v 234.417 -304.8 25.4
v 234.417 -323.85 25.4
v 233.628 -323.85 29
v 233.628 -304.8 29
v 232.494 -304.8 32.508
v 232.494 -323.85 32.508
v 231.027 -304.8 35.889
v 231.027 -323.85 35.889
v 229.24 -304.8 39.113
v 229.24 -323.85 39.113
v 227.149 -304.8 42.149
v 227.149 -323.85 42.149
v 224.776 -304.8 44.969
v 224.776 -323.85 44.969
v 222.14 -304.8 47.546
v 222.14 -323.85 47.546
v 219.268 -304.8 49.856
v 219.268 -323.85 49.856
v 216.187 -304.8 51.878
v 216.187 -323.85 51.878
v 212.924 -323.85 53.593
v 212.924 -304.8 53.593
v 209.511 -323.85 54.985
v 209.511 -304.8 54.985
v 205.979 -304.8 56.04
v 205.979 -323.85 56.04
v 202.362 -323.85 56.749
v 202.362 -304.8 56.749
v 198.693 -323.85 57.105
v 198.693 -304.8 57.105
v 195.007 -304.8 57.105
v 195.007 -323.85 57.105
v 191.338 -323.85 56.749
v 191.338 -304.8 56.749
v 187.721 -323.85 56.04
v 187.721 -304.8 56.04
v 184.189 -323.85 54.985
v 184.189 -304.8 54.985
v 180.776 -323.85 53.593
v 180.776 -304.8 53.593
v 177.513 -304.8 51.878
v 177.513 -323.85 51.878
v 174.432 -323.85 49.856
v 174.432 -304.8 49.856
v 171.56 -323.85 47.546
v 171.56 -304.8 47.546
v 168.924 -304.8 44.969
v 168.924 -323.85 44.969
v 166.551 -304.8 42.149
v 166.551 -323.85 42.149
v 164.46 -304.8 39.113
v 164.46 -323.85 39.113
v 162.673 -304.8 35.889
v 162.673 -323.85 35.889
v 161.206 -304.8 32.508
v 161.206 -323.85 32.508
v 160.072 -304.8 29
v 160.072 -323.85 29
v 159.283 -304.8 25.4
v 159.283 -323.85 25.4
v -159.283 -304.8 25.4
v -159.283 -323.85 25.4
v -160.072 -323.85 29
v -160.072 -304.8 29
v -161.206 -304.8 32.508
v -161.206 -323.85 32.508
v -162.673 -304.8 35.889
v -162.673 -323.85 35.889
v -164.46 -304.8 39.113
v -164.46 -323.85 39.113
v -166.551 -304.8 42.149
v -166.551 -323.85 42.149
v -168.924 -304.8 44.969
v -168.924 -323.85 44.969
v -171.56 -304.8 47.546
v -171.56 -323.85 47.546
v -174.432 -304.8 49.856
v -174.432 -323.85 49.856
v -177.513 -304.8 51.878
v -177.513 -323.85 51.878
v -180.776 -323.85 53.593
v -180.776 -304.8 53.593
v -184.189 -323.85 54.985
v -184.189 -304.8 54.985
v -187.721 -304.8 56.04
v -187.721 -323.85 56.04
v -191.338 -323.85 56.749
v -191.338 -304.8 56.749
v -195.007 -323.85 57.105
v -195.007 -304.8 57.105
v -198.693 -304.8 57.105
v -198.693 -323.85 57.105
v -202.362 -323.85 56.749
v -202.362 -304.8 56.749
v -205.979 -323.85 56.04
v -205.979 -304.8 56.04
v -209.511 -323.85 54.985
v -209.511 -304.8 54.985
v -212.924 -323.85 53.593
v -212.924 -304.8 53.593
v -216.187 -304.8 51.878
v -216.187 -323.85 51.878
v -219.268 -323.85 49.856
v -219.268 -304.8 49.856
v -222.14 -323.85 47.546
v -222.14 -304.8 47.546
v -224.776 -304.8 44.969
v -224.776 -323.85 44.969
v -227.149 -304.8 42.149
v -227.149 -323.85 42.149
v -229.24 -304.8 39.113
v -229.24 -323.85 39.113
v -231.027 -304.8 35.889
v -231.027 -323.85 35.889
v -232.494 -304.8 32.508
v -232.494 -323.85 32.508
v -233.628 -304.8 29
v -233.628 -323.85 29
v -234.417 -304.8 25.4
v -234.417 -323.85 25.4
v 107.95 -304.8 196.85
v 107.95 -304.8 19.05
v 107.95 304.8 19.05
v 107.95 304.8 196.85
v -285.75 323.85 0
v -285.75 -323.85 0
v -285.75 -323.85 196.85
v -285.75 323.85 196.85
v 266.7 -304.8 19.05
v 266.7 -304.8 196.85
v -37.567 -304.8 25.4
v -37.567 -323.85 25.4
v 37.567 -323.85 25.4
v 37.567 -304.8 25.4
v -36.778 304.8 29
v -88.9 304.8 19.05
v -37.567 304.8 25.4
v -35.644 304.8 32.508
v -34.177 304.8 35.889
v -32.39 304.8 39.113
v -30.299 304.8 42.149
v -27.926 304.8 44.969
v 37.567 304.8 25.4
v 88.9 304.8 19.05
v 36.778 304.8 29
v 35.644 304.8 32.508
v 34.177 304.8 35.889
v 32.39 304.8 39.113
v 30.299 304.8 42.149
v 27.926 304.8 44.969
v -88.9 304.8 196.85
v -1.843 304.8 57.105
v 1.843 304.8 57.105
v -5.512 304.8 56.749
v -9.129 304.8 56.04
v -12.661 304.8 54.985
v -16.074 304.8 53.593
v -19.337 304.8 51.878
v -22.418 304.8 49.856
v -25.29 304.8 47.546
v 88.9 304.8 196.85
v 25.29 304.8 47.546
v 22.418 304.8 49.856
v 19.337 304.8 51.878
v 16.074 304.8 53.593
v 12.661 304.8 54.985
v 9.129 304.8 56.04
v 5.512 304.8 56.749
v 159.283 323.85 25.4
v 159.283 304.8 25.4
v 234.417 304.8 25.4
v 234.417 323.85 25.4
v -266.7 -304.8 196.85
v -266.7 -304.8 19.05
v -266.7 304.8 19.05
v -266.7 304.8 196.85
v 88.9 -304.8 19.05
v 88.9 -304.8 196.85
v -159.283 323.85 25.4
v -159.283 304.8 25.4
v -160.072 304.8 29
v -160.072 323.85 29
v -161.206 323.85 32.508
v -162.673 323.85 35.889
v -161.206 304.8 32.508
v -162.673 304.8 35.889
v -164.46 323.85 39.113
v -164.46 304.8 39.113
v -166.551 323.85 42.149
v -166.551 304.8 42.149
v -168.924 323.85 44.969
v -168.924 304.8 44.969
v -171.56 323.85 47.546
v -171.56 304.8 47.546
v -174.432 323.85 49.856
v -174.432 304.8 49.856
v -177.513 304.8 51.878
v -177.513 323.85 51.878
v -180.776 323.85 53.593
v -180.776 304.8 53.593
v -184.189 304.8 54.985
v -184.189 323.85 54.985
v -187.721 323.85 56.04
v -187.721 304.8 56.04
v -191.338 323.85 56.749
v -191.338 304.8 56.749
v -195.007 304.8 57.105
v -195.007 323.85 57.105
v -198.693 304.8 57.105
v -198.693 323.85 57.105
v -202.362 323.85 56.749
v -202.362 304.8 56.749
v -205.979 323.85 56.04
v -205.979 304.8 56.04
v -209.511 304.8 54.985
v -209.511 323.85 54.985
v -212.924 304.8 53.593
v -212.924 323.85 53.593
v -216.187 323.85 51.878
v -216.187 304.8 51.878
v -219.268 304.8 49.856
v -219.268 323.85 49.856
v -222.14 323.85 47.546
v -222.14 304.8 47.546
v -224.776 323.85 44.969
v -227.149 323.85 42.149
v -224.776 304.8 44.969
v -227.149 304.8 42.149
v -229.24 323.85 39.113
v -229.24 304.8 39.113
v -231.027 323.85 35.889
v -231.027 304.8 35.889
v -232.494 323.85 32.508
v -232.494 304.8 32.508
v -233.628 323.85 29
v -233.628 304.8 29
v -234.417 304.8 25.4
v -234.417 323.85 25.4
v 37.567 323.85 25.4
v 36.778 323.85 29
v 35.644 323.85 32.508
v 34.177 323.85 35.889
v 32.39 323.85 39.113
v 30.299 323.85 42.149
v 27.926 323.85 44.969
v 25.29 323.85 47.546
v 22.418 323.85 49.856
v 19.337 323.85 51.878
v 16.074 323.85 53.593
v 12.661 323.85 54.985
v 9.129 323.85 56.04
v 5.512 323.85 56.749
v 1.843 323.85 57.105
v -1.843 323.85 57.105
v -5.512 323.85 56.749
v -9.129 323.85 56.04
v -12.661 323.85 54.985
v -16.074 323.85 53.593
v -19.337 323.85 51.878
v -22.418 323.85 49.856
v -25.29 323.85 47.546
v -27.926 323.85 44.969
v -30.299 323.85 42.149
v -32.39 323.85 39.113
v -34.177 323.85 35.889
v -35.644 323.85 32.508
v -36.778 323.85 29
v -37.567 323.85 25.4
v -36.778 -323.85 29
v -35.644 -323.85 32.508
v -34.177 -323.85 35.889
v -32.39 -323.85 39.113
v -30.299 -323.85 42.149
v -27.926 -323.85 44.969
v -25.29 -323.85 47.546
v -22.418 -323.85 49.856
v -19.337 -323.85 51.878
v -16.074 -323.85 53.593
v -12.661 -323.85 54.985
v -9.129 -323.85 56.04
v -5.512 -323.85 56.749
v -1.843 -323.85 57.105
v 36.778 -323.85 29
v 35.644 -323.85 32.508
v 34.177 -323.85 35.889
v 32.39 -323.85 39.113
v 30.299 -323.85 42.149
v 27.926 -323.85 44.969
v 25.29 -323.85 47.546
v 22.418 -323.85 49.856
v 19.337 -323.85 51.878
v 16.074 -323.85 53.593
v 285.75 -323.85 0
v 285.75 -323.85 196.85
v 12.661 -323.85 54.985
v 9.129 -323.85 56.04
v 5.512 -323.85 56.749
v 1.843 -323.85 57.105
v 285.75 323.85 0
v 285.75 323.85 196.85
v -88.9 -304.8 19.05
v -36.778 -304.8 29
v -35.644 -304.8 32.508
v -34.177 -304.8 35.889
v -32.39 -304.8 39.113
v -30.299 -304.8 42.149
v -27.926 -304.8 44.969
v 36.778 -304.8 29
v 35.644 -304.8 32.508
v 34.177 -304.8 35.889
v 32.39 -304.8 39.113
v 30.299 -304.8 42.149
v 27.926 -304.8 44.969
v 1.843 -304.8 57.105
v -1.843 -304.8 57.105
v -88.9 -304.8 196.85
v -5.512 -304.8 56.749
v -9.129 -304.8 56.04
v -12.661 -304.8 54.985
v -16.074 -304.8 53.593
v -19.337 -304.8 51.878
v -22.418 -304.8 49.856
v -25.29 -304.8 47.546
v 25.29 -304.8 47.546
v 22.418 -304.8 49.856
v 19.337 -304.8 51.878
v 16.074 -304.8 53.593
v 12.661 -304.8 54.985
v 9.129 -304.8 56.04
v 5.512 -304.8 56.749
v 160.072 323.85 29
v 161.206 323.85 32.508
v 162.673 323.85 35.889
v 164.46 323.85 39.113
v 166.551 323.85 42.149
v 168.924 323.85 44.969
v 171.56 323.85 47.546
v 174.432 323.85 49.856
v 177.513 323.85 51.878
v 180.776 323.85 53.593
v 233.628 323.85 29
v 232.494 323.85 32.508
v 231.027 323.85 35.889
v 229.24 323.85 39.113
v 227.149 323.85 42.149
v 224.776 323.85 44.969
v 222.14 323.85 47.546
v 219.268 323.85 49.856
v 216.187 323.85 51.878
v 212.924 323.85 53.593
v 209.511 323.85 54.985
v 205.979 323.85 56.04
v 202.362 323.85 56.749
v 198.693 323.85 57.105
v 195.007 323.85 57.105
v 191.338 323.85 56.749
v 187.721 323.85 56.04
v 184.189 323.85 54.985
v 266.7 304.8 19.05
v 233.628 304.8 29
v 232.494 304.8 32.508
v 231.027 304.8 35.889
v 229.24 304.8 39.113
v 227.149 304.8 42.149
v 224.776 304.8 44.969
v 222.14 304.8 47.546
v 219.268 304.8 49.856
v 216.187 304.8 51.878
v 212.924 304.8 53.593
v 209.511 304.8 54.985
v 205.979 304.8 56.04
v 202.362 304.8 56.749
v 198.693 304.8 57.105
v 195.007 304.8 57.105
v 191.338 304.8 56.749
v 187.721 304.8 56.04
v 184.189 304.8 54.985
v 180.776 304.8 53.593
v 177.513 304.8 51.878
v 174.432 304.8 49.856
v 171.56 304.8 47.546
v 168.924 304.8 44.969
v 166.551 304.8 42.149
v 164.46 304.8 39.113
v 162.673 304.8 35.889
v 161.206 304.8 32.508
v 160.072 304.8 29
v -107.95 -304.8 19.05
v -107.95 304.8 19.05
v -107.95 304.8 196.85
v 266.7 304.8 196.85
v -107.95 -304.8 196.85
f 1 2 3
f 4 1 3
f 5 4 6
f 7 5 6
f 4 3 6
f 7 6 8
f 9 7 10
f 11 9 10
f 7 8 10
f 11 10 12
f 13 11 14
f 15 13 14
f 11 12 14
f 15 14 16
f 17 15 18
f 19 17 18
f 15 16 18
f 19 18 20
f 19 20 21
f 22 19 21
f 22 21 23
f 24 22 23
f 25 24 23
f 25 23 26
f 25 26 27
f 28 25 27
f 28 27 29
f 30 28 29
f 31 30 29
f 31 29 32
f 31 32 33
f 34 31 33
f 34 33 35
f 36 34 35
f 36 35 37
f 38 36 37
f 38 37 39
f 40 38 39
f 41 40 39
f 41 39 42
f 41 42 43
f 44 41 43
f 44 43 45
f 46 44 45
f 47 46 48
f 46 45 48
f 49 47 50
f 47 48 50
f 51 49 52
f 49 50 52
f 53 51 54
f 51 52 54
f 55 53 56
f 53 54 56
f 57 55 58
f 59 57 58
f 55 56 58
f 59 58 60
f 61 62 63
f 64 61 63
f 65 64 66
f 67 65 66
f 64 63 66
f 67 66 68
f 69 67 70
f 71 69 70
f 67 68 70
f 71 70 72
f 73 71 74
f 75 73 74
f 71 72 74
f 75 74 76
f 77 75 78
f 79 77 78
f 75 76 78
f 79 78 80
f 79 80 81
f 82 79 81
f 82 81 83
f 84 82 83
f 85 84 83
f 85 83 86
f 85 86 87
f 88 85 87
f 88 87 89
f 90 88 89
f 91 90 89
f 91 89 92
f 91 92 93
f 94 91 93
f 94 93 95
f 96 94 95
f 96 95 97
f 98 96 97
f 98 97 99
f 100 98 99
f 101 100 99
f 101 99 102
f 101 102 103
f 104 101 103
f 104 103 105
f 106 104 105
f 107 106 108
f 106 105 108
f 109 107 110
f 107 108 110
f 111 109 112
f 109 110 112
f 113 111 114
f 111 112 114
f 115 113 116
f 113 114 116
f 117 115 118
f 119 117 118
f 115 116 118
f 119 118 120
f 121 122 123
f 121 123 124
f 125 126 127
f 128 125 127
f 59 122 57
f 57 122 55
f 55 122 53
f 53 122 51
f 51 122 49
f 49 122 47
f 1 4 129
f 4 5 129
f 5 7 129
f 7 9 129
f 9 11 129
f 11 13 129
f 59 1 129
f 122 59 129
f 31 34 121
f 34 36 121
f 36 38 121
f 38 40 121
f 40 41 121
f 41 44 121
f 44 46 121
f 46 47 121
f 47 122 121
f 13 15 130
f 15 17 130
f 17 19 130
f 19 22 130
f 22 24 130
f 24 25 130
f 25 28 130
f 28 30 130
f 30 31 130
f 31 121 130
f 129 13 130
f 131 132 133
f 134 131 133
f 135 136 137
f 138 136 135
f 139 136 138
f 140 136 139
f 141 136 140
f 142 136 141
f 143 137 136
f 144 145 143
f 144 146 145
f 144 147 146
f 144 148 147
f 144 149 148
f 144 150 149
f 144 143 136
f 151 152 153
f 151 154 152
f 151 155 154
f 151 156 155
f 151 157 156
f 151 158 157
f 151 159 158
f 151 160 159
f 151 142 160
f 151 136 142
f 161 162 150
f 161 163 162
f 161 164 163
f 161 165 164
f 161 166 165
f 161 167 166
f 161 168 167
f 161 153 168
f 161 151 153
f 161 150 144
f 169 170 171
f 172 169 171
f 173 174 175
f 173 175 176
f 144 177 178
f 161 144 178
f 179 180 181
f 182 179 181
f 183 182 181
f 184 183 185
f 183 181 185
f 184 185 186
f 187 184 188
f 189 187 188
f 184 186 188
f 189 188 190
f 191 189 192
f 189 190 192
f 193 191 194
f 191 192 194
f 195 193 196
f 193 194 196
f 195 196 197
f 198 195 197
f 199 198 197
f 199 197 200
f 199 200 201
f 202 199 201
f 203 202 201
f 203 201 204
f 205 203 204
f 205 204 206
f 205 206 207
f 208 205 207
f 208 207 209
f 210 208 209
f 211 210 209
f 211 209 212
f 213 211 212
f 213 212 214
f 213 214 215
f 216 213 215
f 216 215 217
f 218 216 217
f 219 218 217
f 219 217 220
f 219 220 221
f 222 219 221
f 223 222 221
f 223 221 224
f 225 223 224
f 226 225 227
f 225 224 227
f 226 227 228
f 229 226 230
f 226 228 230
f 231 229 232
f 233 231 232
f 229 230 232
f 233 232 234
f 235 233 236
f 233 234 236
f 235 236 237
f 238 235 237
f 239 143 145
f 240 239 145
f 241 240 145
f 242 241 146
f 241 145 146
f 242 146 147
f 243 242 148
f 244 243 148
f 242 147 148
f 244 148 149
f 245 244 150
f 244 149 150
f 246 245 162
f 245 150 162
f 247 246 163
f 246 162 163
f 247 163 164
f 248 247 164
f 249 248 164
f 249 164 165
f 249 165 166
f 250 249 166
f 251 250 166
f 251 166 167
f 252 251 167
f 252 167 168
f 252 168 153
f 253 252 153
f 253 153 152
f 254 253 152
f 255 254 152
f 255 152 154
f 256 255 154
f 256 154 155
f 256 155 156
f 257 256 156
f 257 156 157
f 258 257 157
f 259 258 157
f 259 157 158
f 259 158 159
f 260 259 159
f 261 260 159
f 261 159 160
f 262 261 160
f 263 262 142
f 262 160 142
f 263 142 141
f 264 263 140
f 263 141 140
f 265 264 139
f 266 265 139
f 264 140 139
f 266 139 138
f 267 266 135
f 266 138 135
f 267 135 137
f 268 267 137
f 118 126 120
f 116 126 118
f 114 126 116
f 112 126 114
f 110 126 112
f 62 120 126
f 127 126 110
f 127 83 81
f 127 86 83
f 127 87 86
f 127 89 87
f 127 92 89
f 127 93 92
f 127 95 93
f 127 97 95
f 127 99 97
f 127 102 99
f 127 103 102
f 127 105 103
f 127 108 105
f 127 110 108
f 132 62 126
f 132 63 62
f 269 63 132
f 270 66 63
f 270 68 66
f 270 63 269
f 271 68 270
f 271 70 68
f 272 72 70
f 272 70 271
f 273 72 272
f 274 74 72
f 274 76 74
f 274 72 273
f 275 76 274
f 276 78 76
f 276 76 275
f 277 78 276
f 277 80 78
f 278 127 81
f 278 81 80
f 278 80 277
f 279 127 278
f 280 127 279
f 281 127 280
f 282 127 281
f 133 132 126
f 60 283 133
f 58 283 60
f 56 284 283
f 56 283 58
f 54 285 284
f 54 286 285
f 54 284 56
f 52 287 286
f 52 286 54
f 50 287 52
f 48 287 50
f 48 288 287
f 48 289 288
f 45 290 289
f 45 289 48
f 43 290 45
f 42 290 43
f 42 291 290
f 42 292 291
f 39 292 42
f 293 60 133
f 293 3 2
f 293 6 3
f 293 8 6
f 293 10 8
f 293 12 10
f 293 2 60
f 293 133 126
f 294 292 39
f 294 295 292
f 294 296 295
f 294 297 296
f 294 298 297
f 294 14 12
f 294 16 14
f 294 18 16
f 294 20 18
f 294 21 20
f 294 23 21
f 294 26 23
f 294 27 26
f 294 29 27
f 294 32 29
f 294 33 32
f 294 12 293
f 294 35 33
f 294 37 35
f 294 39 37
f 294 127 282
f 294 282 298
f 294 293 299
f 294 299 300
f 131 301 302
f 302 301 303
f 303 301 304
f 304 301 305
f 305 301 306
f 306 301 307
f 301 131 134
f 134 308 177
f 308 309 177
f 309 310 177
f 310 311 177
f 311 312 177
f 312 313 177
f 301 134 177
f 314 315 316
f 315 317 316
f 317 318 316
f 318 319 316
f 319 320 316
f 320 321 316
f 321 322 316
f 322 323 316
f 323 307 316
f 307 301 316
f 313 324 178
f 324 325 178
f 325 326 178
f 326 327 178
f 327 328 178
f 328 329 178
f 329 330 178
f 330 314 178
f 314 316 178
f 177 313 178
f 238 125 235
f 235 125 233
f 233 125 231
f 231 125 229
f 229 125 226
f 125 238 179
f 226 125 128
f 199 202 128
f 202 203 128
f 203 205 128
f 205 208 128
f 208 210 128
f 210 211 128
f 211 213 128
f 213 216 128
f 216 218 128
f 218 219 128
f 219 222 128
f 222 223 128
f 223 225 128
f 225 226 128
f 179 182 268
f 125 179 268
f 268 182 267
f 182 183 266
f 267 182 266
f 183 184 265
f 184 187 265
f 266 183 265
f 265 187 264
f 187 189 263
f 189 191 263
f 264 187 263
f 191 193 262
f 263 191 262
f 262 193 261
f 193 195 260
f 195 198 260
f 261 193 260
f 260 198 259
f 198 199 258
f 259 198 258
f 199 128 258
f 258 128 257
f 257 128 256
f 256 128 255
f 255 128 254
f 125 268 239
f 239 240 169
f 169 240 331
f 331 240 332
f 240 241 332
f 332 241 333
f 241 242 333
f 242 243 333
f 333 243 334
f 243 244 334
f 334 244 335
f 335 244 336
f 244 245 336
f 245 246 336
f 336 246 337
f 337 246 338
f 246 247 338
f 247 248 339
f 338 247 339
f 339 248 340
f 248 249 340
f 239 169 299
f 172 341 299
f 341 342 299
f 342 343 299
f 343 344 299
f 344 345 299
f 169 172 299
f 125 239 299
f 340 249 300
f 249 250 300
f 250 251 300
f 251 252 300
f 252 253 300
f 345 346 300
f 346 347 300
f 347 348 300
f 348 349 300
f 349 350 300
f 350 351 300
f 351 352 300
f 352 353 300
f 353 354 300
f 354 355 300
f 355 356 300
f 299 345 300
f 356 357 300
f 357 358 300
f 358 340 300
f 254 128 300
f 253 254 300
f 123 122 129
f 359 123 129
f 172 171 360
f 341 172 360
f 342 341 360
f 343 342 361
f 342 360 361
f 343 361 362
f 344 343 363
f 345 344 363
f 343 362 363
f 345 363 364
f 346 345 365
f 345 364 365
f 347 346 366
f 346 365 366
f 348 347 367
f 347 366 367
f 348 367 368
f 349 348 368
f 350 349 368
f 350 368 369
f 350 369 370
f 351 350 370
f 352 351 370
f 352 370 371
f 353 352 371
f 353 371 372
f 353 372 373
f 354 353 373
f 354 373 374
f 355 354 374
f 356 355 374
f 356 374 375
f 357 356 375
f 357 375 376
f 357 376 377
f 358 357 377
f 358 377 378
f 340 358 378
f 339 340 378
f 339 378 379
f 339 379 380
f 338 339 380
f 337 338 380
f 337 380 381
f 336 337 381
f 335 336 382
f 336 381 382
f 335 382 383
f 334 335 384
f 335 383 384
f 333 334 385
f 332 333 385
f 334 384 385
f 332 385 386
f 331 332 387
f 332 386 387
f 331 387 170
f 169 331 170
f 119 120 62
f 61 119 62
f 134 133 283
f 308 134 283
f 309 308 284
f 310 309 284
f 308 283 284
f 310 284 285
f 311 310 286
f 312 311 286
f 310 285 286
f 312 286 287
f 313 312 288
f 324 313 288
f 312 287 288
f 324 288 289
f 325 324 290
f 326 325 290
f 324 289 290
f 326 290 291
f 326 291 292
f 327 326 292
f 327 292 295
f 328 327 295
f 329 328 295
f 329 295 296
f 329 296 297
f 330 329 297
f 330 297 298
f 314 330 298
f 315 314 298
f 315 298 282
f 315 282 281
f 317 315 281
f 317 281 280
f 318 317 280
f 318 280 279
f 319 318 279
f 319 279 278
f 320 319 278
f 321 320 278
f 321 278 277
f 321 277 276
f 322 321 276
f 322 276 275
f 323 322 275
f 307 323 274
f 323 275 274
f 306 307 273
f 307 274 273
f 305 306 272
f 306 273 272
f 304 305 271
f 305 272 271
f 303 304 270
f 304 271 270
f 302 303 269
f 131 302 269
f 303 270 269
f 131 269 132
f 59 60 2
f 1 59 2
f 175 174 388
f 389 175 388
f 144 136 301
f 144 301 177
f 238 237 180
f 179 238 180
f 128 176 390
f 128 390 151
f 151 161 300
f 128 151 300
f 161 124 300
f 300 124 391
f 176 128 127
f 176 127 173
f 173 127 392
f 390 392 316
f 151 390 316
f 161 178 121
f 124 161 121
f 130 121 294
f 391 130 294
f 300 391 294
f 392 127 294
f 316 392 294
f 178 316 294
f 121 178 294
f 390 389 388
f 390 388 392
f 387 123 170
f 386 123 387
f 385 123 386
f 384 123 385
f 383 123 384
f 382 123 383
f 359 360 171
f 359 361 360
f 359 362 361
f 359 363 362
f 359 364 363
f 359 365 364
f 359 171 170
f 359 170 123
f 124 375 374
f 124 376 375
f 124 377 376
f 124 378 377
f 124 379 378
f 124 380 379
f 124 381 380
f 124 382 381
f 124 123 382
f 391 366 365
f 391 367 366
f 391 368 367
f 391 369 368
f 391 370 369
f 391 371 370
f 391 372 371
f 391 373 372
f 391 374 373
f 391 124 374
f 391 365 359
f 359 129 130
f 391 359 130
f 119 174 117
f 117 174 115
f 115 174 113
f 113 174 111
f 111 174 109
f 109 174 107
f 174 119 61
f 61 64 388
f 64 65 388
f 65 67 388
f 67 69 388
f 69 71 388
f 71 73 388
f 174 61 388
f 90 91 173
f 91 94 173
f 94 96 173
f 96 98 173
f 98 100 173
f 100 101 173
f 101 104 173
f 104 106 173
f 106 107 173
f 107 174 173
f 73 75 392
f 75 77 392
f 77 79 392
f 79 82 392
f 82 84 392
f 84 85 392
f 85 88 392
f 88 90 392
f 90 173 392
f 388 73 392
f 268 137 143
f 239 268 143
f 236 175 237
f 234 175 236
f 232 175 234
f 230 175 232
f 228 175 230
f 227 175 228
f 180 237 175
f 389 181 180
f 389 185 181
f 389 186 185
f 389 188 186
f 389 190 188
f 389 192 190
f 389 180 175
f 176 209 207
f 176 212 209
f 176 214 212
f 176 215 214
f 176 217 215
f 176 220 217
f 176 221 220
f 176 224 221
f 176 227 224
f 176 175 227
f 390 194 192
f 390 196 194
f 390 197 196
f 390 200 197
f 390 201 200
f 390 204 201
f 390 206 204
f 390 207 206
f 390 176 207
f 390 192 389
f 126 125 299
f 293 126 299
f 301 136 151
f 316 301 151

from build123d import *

# Parameters (mm, degrees)
F0_W          = 571.5
F0_H          = 196.85
F1_DEPTH      = 323.85
F2_T          = -19.05
F4_DEPTH      = 647.701
F5_W          = 19.05
F5_H          = 177.8
F6_DEPTH      = 304.8
F6_DEPTH_BACK = 304.8


with BuildPart() as f1:
    # F0 (on Front) → F1 (new body, symmetric)
    with BuildSketch(Plane.XZ):
        with Locations((0, 98.425)):
            Rectangle(F0_W, F0_H)
    extrude(amount=F1_DEPTH, both=True)

    # F2
    f2_openings = [f1.faces().sort_by_distance(p)[0] for p in [
        (0, 0, 196.85),
    ]]
    offset(amount=F2_T, openings=f2_openings)

    # F3 (on face) → F4 (cut, through all)
    with BuildSketch(Plane.XZ.offset(323.85)):
        with BuildLine():
            Line((-234.4171066227, 25.4), (-159.2828933773, 25.4))
            ThreePointArc((-159.2828933773, 25.4), (-196.85, 57.15), (-234.4171066227, 25.4))
        make_face()
        with BuildLine():
            Line((-37.5671066227, 25.4), (37.5671066227, 25.4))
            ThreePointArc((37.5671066227, 25.4), (0, 57.15), (-37.5671066227, 25.4))
        make_face()
        with BuildLine():
            ThreePointArc((234.4171066227, 25.4), (196.85, 57.15), (159.2828933773, 25.4))
            Line((159.2828933773, 25.4), (234.4171066227, 25.4))
        make_face()
    extrude(amount=-F4_DEPTH, mode=Mode.SUBTRACT)

    # F5 (on Front) → F6 (join, two sides)
    with BuildSketch(Plane.XZ) as f6_sk:
        with Locations((-98.425, 107.95)):
            Rectangle(F5_W, F5_H)
        with Locations((98.425, 107.95)):
            Rectangle(F5_W, F5_H)
    extrude(amount=F6_DEPTH)
    extrude(f6_sk.sketch, amount=-F6_DEPTH_BACK)


solid = f1.part
